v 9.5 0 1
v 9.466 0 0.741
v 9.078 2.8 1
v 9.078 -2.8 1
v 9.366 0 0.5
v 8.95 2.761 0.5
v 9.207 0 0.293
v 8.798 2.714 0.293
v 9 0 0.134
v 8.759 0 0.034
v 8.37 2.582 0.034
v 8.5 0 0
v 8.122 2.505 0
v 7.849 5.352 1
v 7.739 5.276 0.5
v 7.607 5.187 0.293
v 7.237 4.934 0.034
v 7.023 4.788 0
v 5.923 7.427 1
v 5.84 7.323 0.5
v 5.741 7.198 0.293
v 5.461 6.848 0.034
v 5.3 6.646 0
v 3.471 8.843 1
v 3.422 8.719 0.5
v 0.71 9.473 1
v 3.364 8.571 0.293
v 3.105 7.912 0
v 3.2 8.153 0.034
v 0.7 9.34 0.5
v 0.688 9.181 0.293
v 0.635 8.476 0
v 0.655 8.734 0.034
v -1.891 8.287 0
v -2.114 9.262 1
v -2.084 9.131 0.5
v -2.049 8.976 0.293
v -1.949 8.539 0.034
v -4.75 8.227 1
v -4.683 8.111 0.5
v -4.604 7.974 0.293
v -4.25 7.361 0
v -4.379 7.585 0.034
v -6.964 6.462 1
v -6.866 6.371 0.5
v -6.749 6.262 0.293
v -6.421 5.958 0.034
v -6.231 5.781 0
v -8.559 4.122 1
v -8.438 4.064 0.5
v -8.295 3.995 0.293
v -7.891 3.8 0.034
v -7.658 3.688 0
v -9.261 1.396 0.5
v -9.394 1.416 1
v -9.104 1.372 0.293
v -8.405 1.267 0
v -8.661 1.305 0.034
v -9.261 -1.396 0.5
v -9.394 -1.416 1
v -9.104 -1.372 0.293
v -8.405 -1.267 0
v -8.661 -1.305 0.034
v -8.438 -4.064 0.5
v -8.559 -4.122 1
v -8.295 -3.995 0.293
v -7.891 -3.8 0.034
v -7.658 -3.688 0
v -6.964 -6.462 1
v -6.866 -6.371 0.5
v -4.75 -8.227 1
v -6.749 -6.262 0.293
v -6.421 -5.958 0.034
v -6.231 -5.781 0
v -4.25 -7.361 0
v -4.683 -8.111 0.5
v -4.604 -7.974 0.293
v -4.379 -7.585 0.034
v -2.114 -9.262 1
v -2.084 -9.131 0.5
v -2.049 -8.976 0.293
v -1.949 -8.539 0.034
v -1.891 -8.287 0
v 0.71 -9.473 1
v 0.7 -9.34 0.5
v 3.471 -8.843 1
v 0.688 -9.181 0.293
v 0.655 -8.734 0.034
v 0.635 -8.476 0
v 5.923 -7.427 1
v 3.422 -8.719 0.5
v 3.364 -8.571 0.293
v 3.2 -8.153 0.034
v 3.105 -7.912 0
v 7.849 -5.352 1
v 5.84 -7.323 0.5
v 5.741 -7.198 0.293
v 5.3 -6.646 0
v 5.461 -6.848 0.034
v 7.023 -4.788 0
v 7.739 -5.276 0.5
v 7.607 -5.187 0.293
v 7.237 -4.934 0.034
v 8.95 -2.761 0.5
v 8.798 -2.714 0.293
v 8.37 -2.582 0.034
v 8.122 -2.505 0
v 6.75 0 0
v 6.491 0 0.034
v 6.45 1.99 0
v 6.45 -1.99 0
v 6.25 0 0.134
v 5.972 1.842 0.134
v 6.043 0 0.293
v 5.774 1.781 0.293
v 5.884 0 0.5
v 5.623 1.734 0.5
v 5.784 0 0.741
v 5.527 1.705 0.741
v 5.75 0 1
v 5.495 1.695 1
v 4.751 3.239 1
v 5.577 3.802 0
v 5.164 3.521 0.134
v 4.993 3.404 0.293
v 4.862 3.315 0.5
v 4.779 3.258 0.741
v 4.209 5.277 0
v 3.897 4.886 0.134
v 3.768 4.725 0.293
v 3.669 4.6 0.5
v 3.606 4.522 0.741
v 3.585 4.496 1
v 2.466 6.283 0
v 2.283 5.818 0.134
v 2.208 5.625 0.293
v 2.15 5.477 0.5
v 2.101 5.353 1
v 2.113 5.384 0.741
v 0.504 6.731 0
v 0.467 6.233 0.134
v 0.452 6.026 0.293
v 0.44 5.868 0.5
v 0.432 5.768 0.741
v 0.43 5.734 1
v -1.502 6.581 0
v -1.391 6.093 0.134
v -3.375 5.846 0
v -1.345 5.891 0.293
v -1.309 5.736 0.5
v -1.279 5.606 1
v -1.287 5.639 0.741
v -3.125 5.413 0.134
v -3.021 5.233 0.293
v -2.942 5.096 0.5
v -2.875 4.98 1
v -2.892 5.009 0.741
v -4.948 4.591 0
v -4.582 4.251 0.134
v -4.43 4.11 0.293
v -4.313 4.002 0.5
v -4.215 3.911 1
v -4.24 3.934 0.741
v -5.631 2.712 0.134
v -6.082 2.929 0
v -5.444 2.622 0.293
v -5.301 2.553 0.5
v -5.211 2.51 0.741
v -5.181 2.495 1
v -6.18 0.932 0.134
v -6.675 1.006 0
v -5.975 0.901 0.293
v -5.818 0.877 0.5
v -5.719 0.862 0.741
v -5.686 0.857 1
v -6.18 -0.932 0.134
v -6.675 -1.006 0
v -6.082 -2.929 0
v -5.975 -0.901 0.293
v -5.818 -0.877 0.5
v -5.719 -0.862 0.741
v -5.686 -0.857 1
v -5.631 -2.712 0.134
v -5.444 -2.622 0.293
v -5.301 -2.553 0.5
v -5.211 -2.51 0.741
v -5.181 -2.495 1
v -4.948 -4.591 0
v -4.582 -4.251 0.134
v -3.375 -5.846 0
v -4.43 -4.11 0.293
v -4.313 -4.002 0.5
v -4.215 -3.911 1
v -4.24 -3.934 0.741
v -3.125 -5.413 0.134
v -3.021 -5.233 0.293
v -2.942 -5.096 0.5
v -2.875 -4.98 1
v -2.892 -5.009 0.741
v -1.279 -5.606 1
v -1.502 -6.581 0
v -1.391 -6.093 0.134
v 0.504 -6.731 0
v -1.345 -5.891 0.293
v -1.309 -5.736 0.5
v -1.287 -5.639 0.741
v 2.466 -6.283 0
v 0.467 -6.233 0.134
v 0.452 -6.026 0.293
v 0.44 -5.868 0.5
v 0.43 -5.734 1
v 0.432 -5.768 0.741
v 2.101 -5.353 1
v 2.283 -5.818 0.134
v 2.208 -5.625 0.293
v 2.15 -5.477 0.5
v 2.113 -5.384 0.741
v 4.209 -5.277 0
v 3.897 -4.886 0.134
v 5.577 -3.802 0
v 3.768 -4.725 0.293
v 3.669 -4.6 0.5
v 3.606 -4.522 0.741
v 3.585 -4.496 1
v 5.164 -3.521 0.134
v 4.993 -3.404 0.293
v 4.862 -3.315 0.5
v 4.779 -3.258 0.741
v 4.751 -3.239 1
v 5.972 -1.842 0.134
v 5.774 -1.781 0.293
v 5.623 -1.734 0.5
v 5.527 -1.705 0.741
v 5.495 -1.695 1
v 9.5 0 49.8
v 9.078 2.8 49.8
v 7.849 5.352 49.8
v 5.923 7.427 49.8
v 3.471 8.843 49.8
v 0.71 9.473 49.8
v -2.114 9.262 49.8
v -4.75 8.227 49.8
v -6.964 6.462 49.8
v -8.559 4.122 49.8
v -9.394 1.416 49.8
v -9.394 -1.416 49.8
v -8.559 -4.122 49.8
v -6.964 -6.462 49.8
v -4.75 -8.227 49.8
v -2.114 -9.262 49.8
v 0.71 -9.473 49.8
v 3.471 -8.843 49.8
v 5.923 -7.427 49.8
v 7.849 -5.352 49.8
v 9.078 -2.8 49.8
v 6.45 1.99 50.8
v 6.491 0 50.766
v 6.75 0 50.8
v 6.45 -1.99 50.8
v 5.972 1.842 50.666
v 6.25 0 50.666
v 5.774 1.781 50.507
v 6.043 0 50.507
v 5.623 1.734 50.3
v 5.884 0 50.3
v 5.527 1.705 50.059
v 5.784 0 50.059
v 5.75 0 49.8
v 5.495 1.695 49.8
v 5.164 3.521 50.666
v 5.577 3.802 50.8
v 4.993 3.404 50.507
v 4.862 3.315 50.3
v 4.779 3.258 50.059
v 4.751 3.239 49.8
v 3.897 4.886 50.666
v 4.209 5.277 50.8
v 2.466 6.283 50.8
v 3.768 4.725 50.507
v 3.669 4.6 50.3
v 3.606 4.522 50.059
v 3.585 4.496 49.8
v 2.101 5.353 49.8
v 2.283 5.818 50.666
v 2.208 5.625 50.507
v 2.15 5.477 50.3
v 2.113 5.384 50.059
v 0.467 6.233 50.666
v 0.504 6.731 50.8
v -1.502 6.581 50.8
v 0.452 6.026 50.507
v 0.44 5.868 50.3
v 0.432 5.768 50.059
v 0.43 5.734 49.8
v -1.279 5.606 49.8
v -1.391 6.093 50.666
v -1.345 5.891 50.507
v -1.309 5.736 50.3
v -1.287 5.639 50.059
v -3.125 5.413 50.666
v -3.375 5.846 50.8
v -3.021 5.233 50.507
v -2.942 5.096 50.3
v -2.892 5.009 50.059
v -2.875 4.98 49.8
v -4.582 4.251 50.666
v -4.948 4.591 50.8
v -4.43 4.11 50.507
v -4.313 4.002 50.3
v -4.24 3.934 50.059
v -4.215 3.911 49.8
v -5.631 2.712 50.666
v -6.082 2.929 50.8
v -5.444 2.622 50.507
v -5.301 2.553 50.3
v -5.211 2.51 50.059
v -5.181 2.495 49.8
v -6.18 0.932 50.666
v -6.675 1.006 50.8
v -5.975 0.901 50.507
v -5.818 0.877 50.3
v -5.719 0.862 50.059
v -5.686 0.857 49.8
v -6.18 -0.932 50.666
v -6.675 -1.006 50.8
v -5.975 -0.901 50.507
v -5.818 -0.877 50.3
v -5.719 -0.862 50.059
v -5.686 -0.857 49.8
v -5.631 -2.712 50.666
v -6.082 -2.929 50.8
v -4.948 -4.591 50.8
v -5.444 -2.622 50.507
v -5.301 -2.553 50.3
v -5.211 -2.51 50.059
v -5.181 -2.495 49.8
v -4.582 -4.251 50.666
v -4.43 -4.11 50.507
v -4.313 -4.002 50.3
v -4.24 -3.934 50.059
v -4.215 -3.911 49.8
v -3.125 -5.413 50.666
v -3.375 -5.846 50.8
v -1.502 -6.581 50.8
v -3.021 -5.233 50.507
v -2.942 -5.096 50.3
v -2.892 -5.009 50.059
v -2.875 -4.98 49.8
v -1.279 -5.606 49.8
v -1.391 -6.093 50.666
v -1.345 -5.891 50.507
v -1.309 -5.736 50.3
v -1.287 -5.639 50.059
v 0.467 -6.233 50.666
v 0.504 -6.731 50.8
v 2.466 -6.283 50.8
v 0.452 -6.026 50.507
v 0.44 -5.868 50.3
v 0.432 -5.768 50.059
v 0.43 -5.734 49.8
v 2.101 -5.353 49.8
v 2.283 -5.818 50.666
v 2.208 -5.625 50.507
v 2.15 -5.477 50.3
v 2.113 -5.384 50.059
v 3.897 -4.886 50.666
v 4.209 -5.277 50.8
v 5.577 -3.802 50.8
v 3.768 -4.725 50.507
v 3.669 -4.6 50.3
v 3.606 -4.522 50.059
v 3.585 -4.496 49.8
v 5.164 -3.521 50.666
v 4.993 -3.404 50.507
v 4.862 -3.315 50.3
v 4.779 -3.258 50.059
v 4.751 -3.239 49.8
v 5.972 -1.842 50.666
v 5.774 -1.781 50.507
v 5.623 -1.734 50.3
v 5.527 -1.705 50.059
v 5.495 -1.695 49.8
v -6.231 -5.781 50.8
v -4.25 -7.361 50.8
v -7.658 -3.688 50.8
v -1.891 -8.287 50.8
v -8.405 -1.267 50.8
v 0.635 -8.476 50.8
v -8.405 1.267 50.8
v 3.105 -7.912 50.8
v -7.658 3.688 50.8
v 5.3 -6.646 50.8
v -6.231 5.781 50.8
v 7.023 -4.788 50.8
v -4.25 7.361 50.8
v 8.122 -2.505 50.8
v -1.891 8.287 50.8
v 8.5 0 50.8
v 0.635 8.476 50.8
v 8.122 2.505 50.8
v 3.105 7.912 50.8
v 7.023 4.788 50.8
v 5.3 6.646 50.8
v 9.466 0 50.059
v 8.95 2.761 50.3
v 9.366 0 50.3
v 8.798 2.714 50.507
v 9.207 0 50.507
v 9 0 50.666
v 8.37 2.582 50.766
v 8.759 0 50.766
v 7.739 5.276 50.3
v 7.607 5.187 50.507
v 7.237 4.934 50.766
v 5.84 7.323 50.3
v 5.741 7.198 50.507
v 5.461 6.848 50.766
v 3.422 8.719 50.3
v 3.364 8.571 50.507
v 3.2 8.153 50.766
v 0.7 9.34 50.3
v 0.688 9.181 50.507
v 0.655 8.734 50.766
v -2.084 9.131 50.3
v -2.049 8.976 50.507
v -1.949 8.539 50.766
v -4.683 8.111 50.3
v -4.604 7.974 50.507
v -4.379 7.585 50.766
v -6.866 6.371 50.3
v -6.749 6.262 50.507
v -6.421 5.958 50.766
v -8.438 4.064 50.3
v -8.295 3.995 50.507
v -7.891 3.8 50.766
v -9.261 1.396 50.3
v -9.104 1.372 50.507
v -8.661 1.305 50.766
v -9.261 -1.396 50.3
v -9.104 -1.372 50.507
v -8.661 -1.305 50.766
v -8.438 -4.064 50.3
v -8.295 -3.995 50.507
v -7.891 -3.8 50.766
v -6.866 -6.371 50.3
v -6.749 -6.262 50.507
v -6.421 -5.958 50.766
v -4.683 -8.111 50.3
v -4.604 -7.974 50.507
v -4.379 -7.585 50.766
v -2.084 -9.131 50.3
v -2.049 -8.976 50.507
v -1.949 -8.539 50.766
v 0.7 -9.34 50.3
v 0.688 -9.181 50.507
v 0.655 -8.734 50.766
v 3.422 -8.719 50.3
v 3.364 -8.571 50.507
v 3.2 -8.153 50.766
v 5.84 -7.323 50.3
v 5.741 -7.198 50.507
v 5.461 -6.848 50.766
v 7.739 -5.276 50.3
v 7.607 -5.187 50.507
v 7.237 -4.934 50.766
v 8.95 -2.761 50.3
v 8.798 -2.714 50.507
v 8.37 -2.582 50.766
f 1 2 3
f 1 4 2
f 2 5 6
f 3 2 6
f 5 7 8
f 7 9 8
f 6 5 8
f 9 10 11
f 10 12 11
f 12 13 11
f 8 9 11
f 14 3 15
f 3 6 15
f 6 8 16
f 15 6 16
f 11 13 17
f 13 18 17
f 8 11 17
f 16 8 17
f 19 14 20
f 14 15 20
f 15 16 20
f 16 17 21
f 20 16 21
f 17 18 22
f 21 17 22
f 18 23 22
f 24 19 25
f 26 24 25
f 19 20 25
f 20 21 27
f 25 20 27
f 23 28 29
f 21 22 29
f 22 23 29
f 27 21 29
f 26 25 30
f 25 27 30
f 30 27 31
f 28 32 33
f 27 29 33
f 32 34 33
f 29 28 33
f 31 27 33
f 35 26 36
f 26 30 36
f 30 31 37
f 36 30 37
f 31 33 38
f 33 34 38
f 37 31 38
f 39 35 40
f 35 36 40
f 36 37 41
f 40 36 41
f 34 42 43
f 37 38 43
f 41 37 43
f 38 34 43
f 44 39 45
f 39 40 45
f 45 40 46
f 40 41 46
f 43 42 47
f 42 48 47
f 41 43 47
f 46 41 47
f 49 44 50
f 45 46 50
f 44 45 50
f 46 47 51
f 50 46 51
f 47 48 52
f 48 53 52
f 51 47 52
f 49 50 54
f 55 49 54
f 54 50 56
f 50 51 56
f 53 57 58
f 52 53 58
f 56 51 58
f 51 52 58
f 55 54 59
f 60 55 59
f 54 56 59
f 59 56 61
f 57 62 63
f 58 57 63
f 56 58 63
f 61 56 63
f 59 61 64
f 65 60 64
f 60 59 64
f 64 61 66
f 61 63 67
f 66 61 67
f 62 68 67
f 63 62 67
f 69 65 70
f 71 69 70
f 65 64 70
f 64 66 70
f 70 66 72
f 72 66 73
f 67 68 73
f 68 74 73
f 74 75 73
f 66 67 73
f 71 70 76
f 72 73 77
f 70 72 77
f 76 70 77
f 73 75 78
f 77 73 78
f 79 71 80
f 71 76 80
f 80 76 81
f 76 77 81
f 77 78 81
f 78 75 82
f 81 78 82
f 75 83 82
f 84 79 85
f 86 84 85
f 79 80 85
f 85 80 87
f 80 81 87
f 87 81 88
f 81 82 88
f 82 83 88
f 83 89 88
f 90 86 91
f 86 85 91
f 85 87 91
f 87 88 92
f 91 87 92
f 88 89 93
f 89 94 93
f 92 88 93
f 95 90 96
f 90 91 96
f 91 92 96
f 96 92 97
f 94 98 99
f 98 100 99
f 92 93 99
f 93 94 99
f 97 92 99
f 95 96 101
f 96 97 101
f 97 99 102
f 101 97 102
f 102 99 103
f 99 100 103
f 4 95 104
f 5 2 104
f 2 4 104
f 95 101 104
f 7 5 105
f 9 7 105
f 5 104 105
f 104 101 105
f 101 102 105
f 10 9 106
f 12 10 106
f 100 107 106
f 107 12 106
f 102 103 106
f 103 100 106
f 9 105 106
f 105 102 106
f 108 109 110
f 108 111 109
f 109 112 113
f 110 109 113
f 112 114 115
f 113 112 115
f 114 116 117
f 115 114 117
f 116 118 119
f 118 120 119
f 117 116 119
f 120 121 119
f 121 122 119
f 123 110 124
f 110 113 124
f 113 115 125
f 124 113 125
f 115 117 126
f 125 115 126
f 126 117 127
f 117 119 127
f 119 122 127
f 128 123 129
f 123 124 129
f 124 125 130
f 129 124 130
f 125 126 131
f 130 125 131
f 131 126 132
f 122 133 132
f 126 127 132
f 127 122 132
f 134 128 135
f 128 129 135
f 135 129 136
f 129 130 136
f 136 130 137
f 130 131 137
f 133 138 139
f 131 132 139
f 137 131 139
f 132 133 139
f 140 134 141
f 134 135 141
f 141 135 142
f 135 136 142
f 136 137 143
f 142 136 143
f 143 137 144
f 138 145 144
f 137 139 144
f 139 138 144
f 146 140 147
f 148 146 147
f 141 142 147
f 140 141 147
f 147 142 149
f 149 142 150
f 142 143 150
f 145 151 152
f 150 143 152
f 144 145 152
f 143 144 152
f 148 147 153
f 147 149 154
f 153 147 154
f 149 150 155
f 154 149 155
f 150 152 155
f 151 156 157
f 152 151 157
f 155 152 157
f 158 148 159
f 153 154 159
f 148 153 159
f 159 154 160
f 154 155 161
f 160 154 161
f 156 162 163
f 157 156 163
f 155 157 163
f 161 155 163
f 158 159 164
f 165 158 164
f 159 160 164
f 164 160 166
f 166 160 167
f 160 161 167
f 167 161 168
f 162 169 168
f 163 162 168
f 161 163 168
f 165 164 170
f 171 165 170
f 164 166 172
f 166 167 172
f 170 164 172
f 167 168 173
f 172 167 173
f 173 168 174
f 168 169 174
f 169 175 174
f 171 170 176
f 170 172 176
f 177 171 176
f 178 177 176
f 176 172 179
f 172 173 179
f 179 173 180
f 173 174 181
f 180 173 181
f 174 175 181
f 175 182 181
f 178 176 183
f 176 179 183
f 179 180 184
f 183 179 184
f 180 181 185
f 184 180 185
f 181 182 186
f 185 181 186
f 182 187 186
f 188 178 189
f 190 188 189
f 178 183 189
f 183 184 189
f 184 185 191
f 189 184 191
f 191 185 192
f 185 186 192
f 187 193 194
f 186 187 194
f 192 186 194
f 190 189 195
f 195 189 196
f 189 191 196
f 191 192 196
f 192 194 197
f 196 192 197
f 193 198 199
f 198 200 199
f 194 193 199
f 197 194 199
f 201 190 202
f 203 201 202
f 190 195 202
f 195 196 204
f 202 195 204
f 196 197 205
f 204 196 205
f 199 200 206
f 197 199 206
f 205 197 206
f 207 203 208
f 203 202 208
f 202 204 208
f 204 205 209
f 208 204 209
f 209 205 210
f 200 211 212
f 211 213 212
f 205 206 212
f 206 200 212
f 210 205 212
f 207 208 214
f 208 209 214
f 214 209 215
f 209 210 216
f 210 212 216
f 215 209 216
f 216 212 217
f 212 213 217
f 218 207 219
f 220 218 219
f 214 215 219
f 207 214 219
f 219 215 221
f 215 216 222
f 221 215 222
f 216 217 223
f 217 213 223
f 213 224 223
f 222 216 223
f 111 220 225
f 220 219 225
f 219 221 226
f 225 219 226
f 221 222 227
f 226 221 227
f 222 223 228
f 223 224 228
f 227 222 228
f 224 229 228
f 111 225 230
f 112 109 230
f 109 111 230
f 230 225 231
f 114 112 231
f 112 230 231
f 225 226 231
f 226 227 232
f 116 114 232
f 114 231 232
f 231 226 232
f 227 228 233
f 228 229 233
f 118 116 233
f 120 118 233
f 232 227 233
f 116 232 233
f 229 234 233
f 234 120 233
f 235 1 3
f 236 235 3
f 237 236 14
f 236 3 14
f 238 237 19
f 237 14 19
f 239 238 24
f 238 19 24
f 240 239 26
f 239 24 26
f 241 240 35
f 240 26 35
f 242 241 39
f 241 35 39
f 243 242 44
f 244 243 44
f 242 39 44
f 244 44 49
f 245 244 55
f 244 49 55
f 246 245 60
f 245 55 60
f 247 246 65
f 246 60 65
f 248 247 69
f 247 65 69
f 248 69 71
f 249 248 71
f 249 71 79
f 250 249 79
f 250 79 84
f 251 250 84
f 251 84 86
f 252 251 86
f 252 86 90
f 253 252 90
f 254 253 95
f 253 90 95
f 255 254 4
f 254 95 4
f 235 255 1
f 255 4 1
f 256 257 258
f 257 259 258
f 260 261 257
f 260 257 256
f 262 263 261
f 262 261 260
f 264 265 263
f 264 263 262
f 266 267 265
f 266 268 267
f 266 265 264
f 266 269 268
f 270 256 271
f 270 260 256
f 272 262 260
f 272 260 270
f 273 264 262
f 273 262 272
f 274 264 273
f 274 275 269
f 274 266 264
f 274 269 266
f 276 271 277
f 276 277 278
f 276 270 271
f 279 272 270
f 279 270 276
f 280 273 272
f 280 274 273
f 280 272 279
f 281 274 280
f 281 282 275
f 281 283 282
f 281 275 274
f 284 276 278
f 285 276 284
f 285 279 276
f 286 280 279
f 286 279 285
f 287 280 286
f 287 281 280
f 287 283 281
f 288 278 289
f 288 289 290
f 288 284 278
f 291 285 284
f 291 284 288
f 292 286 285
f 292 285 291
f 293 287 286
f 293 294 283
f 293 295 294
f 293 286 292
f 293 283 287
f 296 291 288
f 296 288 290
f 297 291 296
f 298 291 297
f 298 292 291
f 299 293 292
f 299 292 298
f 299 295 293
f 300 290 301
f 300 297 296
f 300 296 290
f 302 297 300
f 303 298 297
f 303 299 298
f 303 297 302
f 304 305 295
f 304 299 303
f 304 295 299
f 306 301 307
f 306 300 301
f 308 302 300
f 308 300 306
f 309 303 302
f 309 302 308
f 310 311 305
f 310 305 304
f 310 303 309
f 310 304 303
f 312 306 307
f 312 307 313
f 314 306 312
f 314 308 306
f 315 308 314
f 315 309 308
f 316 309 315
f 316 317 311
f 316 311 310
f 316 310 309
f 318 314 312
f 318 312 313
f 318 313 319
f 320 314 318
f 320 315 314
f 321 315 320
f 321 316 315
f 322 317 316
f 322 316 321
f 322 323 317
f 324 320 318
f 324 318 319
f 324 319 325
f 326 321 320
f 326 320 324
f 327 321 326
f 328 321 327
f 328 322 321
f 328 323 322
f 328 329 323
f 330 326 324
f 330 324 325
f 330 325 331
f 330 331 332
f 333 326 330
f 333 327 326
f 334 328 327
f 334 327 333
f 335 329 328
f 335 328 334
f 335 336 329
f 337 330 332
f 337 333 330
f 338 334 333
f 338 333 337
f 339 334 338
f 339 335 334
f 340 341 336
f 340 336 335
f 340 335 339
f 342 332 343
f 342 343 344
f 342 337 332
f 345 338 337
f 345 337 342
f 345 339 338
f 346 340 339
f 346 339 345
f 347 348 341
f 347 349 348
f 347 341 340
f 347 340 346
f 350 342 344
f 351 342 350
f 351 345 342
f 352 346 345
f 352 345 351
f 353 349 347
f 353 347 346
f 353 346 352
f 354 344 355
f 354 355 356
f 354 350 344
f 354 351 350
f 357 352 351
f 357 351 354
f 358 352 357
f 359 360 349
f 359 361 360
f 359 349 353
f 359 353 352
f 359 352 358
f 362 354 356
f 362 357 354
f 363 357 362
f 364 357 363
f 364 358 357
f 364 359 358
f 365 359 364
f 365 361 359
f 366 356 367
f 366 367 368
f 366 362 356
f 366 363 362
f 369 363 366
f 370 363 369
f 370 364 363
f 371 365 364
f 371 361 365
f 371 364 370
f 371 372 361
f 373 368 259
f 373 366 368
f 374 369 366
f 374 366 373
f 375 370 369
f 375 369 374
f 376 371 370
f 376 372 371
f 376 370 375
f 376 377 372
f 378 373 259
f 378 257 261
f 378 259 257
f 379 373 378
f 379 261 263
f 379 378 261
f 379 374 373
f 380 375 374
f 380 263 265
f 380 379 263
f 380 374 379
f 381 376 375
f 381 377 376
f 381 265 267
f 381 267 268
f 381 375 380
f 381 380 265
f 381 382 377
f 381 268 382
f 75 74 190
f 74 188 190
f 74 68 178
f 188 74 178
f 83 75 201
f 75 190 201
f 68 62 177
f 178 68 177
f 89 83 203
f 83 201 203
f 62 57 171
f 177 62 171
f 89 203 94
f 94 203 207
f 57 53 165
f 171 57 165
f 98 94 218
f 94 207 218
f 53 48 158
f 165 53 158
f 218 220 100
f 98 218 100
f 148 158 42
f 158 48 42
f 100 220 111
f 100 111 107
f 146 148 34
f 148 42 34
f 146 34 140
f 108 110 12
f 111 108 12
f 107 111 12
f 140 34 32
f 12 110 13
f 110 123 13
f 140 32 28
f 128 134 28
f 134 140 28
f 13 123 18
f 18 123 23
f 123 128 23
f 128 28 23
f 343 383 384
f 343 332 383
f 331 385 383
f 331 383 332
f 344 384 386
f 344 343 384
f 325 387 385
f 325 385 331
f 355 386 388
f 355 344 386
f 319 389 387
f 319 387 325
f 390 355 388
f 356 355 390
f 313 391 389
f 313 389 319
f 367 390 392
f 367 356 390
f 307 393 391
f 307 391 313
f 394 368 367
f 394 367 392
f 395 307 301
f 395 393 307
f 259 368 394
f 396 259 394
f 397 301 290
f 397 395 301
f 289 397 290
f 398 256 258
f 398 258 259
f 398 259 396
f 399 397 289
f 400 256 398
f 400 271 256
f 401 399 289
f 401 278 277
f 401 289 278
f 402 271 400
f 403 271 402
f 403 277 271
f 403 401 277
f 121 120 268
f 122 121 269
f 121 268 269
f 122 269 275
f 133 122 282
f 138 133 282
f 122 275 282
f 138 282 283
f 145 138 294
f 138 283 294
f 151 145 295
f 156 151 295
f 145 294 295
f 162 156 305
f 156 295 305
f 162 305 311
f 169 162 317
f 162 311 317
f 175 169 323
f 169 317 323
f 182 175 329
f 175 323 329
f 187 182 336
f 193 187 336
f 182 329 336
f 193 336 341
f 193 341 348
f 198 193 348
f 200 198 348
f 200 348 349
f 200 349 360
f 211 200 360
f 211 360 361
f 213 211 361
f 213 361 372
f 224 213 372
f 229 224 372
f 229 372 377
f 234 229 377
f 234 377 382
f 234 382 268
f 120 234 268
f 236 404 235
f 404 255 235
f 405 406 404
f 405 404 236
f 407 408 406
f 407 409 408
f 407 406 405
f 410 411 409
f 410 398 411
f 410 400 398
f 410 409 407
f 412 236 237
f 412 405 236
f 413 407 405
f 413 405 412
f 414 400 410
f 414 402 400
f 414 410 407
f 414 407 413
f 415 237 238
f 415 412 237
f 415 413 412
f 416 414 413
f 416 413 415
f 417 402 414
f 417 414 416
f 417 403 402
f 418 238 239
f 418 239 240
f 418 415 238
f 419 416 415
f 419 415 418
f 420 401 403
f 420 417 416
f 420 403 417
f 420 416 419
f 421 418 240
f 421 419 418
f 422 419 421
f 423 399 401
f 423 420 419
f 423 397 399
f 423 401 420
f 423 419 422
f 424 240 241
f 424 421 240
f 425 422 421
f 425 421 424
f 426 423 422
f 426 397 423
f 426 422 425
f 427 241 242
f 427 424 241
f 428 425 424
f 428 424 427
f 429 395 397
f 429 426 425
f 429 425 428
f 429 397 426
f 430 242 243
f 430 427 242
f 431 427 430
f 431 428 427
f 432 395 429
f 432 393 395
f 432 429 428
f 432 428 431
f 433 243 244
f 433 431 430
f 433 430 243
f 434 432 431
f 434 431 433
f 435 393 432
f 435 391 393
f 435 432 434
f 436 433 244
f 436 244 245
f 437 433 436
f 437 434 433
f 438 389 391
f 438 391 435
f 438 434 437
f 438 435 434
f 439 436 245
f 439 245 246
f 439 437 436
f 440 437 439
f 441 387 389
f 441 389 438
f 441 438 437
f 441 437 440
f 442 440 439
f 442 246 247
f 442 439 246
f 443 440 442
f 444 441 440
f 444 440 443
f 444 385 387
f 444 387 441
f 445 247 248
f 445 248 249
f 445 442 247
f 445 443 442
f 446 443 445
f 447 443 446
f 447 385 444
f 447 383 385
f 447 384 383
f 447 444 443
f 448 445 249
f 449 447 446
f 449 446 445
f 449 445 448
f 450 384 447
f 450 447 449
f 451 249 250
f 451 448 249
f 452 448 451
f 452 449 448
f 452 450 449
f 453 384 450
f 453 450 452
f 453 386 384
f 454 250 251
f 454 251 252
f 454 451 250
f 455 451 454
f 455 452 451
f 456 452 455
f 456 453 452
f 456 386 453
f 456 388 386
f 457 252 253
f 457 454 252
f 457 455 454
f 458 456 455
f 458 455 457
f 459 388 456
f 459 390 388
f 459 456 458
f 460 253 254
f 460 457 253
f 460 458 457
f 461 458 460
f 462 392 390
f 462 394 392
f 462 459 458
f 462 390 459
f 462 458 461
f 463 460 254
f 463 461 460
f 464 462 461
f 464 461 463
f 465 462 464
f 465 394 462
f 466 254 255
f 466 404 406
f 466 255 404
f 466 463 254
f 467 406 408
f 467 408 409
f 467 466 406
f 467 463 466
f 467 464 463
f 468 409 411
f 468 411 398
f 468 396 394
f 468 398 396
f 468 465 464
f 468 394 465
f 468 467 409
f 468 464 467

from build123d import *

# Parameters (mm, degrees)
ESQUISSE1_R      = 9.5
EXTRUSION1_DEPTH = 50.8
ESQUISSE2_R      = 5.75
EXTRUSION2_DEPTH = 53.546550791
FILLET1_R        = 1


with BuildPart() as part:
    # Esquisse1 → Extrusion1 (new body)
    with BuildSketch(Plane.XY):
        Circle(ESQUISSE1_R)
    extrude(amount=EXTRUSION1_DEPTH)

    # Esquisse2 → Extrusion2 (cut, through all)
    with BuildSketch(Plane.XY.offset(50.8)):
        Circle(ESQUISSE2_R)
    extrude(amount=-EXTRUSION2_DEPTH, mode=Mode.SUBTRACT)

    # Fillet1
    fillet1_edges = [part.edges().sort_by_distance(p)[0] for p in [
        (-9.5, 0, 0),
        (-9.5, 0, 50.8),
        (-5.75, 0, 0),
        (-5.75, 0, 50.8),
    ]]
    fillet(fillet1_edges, radius=FILLET1_R)


solid = part.part
